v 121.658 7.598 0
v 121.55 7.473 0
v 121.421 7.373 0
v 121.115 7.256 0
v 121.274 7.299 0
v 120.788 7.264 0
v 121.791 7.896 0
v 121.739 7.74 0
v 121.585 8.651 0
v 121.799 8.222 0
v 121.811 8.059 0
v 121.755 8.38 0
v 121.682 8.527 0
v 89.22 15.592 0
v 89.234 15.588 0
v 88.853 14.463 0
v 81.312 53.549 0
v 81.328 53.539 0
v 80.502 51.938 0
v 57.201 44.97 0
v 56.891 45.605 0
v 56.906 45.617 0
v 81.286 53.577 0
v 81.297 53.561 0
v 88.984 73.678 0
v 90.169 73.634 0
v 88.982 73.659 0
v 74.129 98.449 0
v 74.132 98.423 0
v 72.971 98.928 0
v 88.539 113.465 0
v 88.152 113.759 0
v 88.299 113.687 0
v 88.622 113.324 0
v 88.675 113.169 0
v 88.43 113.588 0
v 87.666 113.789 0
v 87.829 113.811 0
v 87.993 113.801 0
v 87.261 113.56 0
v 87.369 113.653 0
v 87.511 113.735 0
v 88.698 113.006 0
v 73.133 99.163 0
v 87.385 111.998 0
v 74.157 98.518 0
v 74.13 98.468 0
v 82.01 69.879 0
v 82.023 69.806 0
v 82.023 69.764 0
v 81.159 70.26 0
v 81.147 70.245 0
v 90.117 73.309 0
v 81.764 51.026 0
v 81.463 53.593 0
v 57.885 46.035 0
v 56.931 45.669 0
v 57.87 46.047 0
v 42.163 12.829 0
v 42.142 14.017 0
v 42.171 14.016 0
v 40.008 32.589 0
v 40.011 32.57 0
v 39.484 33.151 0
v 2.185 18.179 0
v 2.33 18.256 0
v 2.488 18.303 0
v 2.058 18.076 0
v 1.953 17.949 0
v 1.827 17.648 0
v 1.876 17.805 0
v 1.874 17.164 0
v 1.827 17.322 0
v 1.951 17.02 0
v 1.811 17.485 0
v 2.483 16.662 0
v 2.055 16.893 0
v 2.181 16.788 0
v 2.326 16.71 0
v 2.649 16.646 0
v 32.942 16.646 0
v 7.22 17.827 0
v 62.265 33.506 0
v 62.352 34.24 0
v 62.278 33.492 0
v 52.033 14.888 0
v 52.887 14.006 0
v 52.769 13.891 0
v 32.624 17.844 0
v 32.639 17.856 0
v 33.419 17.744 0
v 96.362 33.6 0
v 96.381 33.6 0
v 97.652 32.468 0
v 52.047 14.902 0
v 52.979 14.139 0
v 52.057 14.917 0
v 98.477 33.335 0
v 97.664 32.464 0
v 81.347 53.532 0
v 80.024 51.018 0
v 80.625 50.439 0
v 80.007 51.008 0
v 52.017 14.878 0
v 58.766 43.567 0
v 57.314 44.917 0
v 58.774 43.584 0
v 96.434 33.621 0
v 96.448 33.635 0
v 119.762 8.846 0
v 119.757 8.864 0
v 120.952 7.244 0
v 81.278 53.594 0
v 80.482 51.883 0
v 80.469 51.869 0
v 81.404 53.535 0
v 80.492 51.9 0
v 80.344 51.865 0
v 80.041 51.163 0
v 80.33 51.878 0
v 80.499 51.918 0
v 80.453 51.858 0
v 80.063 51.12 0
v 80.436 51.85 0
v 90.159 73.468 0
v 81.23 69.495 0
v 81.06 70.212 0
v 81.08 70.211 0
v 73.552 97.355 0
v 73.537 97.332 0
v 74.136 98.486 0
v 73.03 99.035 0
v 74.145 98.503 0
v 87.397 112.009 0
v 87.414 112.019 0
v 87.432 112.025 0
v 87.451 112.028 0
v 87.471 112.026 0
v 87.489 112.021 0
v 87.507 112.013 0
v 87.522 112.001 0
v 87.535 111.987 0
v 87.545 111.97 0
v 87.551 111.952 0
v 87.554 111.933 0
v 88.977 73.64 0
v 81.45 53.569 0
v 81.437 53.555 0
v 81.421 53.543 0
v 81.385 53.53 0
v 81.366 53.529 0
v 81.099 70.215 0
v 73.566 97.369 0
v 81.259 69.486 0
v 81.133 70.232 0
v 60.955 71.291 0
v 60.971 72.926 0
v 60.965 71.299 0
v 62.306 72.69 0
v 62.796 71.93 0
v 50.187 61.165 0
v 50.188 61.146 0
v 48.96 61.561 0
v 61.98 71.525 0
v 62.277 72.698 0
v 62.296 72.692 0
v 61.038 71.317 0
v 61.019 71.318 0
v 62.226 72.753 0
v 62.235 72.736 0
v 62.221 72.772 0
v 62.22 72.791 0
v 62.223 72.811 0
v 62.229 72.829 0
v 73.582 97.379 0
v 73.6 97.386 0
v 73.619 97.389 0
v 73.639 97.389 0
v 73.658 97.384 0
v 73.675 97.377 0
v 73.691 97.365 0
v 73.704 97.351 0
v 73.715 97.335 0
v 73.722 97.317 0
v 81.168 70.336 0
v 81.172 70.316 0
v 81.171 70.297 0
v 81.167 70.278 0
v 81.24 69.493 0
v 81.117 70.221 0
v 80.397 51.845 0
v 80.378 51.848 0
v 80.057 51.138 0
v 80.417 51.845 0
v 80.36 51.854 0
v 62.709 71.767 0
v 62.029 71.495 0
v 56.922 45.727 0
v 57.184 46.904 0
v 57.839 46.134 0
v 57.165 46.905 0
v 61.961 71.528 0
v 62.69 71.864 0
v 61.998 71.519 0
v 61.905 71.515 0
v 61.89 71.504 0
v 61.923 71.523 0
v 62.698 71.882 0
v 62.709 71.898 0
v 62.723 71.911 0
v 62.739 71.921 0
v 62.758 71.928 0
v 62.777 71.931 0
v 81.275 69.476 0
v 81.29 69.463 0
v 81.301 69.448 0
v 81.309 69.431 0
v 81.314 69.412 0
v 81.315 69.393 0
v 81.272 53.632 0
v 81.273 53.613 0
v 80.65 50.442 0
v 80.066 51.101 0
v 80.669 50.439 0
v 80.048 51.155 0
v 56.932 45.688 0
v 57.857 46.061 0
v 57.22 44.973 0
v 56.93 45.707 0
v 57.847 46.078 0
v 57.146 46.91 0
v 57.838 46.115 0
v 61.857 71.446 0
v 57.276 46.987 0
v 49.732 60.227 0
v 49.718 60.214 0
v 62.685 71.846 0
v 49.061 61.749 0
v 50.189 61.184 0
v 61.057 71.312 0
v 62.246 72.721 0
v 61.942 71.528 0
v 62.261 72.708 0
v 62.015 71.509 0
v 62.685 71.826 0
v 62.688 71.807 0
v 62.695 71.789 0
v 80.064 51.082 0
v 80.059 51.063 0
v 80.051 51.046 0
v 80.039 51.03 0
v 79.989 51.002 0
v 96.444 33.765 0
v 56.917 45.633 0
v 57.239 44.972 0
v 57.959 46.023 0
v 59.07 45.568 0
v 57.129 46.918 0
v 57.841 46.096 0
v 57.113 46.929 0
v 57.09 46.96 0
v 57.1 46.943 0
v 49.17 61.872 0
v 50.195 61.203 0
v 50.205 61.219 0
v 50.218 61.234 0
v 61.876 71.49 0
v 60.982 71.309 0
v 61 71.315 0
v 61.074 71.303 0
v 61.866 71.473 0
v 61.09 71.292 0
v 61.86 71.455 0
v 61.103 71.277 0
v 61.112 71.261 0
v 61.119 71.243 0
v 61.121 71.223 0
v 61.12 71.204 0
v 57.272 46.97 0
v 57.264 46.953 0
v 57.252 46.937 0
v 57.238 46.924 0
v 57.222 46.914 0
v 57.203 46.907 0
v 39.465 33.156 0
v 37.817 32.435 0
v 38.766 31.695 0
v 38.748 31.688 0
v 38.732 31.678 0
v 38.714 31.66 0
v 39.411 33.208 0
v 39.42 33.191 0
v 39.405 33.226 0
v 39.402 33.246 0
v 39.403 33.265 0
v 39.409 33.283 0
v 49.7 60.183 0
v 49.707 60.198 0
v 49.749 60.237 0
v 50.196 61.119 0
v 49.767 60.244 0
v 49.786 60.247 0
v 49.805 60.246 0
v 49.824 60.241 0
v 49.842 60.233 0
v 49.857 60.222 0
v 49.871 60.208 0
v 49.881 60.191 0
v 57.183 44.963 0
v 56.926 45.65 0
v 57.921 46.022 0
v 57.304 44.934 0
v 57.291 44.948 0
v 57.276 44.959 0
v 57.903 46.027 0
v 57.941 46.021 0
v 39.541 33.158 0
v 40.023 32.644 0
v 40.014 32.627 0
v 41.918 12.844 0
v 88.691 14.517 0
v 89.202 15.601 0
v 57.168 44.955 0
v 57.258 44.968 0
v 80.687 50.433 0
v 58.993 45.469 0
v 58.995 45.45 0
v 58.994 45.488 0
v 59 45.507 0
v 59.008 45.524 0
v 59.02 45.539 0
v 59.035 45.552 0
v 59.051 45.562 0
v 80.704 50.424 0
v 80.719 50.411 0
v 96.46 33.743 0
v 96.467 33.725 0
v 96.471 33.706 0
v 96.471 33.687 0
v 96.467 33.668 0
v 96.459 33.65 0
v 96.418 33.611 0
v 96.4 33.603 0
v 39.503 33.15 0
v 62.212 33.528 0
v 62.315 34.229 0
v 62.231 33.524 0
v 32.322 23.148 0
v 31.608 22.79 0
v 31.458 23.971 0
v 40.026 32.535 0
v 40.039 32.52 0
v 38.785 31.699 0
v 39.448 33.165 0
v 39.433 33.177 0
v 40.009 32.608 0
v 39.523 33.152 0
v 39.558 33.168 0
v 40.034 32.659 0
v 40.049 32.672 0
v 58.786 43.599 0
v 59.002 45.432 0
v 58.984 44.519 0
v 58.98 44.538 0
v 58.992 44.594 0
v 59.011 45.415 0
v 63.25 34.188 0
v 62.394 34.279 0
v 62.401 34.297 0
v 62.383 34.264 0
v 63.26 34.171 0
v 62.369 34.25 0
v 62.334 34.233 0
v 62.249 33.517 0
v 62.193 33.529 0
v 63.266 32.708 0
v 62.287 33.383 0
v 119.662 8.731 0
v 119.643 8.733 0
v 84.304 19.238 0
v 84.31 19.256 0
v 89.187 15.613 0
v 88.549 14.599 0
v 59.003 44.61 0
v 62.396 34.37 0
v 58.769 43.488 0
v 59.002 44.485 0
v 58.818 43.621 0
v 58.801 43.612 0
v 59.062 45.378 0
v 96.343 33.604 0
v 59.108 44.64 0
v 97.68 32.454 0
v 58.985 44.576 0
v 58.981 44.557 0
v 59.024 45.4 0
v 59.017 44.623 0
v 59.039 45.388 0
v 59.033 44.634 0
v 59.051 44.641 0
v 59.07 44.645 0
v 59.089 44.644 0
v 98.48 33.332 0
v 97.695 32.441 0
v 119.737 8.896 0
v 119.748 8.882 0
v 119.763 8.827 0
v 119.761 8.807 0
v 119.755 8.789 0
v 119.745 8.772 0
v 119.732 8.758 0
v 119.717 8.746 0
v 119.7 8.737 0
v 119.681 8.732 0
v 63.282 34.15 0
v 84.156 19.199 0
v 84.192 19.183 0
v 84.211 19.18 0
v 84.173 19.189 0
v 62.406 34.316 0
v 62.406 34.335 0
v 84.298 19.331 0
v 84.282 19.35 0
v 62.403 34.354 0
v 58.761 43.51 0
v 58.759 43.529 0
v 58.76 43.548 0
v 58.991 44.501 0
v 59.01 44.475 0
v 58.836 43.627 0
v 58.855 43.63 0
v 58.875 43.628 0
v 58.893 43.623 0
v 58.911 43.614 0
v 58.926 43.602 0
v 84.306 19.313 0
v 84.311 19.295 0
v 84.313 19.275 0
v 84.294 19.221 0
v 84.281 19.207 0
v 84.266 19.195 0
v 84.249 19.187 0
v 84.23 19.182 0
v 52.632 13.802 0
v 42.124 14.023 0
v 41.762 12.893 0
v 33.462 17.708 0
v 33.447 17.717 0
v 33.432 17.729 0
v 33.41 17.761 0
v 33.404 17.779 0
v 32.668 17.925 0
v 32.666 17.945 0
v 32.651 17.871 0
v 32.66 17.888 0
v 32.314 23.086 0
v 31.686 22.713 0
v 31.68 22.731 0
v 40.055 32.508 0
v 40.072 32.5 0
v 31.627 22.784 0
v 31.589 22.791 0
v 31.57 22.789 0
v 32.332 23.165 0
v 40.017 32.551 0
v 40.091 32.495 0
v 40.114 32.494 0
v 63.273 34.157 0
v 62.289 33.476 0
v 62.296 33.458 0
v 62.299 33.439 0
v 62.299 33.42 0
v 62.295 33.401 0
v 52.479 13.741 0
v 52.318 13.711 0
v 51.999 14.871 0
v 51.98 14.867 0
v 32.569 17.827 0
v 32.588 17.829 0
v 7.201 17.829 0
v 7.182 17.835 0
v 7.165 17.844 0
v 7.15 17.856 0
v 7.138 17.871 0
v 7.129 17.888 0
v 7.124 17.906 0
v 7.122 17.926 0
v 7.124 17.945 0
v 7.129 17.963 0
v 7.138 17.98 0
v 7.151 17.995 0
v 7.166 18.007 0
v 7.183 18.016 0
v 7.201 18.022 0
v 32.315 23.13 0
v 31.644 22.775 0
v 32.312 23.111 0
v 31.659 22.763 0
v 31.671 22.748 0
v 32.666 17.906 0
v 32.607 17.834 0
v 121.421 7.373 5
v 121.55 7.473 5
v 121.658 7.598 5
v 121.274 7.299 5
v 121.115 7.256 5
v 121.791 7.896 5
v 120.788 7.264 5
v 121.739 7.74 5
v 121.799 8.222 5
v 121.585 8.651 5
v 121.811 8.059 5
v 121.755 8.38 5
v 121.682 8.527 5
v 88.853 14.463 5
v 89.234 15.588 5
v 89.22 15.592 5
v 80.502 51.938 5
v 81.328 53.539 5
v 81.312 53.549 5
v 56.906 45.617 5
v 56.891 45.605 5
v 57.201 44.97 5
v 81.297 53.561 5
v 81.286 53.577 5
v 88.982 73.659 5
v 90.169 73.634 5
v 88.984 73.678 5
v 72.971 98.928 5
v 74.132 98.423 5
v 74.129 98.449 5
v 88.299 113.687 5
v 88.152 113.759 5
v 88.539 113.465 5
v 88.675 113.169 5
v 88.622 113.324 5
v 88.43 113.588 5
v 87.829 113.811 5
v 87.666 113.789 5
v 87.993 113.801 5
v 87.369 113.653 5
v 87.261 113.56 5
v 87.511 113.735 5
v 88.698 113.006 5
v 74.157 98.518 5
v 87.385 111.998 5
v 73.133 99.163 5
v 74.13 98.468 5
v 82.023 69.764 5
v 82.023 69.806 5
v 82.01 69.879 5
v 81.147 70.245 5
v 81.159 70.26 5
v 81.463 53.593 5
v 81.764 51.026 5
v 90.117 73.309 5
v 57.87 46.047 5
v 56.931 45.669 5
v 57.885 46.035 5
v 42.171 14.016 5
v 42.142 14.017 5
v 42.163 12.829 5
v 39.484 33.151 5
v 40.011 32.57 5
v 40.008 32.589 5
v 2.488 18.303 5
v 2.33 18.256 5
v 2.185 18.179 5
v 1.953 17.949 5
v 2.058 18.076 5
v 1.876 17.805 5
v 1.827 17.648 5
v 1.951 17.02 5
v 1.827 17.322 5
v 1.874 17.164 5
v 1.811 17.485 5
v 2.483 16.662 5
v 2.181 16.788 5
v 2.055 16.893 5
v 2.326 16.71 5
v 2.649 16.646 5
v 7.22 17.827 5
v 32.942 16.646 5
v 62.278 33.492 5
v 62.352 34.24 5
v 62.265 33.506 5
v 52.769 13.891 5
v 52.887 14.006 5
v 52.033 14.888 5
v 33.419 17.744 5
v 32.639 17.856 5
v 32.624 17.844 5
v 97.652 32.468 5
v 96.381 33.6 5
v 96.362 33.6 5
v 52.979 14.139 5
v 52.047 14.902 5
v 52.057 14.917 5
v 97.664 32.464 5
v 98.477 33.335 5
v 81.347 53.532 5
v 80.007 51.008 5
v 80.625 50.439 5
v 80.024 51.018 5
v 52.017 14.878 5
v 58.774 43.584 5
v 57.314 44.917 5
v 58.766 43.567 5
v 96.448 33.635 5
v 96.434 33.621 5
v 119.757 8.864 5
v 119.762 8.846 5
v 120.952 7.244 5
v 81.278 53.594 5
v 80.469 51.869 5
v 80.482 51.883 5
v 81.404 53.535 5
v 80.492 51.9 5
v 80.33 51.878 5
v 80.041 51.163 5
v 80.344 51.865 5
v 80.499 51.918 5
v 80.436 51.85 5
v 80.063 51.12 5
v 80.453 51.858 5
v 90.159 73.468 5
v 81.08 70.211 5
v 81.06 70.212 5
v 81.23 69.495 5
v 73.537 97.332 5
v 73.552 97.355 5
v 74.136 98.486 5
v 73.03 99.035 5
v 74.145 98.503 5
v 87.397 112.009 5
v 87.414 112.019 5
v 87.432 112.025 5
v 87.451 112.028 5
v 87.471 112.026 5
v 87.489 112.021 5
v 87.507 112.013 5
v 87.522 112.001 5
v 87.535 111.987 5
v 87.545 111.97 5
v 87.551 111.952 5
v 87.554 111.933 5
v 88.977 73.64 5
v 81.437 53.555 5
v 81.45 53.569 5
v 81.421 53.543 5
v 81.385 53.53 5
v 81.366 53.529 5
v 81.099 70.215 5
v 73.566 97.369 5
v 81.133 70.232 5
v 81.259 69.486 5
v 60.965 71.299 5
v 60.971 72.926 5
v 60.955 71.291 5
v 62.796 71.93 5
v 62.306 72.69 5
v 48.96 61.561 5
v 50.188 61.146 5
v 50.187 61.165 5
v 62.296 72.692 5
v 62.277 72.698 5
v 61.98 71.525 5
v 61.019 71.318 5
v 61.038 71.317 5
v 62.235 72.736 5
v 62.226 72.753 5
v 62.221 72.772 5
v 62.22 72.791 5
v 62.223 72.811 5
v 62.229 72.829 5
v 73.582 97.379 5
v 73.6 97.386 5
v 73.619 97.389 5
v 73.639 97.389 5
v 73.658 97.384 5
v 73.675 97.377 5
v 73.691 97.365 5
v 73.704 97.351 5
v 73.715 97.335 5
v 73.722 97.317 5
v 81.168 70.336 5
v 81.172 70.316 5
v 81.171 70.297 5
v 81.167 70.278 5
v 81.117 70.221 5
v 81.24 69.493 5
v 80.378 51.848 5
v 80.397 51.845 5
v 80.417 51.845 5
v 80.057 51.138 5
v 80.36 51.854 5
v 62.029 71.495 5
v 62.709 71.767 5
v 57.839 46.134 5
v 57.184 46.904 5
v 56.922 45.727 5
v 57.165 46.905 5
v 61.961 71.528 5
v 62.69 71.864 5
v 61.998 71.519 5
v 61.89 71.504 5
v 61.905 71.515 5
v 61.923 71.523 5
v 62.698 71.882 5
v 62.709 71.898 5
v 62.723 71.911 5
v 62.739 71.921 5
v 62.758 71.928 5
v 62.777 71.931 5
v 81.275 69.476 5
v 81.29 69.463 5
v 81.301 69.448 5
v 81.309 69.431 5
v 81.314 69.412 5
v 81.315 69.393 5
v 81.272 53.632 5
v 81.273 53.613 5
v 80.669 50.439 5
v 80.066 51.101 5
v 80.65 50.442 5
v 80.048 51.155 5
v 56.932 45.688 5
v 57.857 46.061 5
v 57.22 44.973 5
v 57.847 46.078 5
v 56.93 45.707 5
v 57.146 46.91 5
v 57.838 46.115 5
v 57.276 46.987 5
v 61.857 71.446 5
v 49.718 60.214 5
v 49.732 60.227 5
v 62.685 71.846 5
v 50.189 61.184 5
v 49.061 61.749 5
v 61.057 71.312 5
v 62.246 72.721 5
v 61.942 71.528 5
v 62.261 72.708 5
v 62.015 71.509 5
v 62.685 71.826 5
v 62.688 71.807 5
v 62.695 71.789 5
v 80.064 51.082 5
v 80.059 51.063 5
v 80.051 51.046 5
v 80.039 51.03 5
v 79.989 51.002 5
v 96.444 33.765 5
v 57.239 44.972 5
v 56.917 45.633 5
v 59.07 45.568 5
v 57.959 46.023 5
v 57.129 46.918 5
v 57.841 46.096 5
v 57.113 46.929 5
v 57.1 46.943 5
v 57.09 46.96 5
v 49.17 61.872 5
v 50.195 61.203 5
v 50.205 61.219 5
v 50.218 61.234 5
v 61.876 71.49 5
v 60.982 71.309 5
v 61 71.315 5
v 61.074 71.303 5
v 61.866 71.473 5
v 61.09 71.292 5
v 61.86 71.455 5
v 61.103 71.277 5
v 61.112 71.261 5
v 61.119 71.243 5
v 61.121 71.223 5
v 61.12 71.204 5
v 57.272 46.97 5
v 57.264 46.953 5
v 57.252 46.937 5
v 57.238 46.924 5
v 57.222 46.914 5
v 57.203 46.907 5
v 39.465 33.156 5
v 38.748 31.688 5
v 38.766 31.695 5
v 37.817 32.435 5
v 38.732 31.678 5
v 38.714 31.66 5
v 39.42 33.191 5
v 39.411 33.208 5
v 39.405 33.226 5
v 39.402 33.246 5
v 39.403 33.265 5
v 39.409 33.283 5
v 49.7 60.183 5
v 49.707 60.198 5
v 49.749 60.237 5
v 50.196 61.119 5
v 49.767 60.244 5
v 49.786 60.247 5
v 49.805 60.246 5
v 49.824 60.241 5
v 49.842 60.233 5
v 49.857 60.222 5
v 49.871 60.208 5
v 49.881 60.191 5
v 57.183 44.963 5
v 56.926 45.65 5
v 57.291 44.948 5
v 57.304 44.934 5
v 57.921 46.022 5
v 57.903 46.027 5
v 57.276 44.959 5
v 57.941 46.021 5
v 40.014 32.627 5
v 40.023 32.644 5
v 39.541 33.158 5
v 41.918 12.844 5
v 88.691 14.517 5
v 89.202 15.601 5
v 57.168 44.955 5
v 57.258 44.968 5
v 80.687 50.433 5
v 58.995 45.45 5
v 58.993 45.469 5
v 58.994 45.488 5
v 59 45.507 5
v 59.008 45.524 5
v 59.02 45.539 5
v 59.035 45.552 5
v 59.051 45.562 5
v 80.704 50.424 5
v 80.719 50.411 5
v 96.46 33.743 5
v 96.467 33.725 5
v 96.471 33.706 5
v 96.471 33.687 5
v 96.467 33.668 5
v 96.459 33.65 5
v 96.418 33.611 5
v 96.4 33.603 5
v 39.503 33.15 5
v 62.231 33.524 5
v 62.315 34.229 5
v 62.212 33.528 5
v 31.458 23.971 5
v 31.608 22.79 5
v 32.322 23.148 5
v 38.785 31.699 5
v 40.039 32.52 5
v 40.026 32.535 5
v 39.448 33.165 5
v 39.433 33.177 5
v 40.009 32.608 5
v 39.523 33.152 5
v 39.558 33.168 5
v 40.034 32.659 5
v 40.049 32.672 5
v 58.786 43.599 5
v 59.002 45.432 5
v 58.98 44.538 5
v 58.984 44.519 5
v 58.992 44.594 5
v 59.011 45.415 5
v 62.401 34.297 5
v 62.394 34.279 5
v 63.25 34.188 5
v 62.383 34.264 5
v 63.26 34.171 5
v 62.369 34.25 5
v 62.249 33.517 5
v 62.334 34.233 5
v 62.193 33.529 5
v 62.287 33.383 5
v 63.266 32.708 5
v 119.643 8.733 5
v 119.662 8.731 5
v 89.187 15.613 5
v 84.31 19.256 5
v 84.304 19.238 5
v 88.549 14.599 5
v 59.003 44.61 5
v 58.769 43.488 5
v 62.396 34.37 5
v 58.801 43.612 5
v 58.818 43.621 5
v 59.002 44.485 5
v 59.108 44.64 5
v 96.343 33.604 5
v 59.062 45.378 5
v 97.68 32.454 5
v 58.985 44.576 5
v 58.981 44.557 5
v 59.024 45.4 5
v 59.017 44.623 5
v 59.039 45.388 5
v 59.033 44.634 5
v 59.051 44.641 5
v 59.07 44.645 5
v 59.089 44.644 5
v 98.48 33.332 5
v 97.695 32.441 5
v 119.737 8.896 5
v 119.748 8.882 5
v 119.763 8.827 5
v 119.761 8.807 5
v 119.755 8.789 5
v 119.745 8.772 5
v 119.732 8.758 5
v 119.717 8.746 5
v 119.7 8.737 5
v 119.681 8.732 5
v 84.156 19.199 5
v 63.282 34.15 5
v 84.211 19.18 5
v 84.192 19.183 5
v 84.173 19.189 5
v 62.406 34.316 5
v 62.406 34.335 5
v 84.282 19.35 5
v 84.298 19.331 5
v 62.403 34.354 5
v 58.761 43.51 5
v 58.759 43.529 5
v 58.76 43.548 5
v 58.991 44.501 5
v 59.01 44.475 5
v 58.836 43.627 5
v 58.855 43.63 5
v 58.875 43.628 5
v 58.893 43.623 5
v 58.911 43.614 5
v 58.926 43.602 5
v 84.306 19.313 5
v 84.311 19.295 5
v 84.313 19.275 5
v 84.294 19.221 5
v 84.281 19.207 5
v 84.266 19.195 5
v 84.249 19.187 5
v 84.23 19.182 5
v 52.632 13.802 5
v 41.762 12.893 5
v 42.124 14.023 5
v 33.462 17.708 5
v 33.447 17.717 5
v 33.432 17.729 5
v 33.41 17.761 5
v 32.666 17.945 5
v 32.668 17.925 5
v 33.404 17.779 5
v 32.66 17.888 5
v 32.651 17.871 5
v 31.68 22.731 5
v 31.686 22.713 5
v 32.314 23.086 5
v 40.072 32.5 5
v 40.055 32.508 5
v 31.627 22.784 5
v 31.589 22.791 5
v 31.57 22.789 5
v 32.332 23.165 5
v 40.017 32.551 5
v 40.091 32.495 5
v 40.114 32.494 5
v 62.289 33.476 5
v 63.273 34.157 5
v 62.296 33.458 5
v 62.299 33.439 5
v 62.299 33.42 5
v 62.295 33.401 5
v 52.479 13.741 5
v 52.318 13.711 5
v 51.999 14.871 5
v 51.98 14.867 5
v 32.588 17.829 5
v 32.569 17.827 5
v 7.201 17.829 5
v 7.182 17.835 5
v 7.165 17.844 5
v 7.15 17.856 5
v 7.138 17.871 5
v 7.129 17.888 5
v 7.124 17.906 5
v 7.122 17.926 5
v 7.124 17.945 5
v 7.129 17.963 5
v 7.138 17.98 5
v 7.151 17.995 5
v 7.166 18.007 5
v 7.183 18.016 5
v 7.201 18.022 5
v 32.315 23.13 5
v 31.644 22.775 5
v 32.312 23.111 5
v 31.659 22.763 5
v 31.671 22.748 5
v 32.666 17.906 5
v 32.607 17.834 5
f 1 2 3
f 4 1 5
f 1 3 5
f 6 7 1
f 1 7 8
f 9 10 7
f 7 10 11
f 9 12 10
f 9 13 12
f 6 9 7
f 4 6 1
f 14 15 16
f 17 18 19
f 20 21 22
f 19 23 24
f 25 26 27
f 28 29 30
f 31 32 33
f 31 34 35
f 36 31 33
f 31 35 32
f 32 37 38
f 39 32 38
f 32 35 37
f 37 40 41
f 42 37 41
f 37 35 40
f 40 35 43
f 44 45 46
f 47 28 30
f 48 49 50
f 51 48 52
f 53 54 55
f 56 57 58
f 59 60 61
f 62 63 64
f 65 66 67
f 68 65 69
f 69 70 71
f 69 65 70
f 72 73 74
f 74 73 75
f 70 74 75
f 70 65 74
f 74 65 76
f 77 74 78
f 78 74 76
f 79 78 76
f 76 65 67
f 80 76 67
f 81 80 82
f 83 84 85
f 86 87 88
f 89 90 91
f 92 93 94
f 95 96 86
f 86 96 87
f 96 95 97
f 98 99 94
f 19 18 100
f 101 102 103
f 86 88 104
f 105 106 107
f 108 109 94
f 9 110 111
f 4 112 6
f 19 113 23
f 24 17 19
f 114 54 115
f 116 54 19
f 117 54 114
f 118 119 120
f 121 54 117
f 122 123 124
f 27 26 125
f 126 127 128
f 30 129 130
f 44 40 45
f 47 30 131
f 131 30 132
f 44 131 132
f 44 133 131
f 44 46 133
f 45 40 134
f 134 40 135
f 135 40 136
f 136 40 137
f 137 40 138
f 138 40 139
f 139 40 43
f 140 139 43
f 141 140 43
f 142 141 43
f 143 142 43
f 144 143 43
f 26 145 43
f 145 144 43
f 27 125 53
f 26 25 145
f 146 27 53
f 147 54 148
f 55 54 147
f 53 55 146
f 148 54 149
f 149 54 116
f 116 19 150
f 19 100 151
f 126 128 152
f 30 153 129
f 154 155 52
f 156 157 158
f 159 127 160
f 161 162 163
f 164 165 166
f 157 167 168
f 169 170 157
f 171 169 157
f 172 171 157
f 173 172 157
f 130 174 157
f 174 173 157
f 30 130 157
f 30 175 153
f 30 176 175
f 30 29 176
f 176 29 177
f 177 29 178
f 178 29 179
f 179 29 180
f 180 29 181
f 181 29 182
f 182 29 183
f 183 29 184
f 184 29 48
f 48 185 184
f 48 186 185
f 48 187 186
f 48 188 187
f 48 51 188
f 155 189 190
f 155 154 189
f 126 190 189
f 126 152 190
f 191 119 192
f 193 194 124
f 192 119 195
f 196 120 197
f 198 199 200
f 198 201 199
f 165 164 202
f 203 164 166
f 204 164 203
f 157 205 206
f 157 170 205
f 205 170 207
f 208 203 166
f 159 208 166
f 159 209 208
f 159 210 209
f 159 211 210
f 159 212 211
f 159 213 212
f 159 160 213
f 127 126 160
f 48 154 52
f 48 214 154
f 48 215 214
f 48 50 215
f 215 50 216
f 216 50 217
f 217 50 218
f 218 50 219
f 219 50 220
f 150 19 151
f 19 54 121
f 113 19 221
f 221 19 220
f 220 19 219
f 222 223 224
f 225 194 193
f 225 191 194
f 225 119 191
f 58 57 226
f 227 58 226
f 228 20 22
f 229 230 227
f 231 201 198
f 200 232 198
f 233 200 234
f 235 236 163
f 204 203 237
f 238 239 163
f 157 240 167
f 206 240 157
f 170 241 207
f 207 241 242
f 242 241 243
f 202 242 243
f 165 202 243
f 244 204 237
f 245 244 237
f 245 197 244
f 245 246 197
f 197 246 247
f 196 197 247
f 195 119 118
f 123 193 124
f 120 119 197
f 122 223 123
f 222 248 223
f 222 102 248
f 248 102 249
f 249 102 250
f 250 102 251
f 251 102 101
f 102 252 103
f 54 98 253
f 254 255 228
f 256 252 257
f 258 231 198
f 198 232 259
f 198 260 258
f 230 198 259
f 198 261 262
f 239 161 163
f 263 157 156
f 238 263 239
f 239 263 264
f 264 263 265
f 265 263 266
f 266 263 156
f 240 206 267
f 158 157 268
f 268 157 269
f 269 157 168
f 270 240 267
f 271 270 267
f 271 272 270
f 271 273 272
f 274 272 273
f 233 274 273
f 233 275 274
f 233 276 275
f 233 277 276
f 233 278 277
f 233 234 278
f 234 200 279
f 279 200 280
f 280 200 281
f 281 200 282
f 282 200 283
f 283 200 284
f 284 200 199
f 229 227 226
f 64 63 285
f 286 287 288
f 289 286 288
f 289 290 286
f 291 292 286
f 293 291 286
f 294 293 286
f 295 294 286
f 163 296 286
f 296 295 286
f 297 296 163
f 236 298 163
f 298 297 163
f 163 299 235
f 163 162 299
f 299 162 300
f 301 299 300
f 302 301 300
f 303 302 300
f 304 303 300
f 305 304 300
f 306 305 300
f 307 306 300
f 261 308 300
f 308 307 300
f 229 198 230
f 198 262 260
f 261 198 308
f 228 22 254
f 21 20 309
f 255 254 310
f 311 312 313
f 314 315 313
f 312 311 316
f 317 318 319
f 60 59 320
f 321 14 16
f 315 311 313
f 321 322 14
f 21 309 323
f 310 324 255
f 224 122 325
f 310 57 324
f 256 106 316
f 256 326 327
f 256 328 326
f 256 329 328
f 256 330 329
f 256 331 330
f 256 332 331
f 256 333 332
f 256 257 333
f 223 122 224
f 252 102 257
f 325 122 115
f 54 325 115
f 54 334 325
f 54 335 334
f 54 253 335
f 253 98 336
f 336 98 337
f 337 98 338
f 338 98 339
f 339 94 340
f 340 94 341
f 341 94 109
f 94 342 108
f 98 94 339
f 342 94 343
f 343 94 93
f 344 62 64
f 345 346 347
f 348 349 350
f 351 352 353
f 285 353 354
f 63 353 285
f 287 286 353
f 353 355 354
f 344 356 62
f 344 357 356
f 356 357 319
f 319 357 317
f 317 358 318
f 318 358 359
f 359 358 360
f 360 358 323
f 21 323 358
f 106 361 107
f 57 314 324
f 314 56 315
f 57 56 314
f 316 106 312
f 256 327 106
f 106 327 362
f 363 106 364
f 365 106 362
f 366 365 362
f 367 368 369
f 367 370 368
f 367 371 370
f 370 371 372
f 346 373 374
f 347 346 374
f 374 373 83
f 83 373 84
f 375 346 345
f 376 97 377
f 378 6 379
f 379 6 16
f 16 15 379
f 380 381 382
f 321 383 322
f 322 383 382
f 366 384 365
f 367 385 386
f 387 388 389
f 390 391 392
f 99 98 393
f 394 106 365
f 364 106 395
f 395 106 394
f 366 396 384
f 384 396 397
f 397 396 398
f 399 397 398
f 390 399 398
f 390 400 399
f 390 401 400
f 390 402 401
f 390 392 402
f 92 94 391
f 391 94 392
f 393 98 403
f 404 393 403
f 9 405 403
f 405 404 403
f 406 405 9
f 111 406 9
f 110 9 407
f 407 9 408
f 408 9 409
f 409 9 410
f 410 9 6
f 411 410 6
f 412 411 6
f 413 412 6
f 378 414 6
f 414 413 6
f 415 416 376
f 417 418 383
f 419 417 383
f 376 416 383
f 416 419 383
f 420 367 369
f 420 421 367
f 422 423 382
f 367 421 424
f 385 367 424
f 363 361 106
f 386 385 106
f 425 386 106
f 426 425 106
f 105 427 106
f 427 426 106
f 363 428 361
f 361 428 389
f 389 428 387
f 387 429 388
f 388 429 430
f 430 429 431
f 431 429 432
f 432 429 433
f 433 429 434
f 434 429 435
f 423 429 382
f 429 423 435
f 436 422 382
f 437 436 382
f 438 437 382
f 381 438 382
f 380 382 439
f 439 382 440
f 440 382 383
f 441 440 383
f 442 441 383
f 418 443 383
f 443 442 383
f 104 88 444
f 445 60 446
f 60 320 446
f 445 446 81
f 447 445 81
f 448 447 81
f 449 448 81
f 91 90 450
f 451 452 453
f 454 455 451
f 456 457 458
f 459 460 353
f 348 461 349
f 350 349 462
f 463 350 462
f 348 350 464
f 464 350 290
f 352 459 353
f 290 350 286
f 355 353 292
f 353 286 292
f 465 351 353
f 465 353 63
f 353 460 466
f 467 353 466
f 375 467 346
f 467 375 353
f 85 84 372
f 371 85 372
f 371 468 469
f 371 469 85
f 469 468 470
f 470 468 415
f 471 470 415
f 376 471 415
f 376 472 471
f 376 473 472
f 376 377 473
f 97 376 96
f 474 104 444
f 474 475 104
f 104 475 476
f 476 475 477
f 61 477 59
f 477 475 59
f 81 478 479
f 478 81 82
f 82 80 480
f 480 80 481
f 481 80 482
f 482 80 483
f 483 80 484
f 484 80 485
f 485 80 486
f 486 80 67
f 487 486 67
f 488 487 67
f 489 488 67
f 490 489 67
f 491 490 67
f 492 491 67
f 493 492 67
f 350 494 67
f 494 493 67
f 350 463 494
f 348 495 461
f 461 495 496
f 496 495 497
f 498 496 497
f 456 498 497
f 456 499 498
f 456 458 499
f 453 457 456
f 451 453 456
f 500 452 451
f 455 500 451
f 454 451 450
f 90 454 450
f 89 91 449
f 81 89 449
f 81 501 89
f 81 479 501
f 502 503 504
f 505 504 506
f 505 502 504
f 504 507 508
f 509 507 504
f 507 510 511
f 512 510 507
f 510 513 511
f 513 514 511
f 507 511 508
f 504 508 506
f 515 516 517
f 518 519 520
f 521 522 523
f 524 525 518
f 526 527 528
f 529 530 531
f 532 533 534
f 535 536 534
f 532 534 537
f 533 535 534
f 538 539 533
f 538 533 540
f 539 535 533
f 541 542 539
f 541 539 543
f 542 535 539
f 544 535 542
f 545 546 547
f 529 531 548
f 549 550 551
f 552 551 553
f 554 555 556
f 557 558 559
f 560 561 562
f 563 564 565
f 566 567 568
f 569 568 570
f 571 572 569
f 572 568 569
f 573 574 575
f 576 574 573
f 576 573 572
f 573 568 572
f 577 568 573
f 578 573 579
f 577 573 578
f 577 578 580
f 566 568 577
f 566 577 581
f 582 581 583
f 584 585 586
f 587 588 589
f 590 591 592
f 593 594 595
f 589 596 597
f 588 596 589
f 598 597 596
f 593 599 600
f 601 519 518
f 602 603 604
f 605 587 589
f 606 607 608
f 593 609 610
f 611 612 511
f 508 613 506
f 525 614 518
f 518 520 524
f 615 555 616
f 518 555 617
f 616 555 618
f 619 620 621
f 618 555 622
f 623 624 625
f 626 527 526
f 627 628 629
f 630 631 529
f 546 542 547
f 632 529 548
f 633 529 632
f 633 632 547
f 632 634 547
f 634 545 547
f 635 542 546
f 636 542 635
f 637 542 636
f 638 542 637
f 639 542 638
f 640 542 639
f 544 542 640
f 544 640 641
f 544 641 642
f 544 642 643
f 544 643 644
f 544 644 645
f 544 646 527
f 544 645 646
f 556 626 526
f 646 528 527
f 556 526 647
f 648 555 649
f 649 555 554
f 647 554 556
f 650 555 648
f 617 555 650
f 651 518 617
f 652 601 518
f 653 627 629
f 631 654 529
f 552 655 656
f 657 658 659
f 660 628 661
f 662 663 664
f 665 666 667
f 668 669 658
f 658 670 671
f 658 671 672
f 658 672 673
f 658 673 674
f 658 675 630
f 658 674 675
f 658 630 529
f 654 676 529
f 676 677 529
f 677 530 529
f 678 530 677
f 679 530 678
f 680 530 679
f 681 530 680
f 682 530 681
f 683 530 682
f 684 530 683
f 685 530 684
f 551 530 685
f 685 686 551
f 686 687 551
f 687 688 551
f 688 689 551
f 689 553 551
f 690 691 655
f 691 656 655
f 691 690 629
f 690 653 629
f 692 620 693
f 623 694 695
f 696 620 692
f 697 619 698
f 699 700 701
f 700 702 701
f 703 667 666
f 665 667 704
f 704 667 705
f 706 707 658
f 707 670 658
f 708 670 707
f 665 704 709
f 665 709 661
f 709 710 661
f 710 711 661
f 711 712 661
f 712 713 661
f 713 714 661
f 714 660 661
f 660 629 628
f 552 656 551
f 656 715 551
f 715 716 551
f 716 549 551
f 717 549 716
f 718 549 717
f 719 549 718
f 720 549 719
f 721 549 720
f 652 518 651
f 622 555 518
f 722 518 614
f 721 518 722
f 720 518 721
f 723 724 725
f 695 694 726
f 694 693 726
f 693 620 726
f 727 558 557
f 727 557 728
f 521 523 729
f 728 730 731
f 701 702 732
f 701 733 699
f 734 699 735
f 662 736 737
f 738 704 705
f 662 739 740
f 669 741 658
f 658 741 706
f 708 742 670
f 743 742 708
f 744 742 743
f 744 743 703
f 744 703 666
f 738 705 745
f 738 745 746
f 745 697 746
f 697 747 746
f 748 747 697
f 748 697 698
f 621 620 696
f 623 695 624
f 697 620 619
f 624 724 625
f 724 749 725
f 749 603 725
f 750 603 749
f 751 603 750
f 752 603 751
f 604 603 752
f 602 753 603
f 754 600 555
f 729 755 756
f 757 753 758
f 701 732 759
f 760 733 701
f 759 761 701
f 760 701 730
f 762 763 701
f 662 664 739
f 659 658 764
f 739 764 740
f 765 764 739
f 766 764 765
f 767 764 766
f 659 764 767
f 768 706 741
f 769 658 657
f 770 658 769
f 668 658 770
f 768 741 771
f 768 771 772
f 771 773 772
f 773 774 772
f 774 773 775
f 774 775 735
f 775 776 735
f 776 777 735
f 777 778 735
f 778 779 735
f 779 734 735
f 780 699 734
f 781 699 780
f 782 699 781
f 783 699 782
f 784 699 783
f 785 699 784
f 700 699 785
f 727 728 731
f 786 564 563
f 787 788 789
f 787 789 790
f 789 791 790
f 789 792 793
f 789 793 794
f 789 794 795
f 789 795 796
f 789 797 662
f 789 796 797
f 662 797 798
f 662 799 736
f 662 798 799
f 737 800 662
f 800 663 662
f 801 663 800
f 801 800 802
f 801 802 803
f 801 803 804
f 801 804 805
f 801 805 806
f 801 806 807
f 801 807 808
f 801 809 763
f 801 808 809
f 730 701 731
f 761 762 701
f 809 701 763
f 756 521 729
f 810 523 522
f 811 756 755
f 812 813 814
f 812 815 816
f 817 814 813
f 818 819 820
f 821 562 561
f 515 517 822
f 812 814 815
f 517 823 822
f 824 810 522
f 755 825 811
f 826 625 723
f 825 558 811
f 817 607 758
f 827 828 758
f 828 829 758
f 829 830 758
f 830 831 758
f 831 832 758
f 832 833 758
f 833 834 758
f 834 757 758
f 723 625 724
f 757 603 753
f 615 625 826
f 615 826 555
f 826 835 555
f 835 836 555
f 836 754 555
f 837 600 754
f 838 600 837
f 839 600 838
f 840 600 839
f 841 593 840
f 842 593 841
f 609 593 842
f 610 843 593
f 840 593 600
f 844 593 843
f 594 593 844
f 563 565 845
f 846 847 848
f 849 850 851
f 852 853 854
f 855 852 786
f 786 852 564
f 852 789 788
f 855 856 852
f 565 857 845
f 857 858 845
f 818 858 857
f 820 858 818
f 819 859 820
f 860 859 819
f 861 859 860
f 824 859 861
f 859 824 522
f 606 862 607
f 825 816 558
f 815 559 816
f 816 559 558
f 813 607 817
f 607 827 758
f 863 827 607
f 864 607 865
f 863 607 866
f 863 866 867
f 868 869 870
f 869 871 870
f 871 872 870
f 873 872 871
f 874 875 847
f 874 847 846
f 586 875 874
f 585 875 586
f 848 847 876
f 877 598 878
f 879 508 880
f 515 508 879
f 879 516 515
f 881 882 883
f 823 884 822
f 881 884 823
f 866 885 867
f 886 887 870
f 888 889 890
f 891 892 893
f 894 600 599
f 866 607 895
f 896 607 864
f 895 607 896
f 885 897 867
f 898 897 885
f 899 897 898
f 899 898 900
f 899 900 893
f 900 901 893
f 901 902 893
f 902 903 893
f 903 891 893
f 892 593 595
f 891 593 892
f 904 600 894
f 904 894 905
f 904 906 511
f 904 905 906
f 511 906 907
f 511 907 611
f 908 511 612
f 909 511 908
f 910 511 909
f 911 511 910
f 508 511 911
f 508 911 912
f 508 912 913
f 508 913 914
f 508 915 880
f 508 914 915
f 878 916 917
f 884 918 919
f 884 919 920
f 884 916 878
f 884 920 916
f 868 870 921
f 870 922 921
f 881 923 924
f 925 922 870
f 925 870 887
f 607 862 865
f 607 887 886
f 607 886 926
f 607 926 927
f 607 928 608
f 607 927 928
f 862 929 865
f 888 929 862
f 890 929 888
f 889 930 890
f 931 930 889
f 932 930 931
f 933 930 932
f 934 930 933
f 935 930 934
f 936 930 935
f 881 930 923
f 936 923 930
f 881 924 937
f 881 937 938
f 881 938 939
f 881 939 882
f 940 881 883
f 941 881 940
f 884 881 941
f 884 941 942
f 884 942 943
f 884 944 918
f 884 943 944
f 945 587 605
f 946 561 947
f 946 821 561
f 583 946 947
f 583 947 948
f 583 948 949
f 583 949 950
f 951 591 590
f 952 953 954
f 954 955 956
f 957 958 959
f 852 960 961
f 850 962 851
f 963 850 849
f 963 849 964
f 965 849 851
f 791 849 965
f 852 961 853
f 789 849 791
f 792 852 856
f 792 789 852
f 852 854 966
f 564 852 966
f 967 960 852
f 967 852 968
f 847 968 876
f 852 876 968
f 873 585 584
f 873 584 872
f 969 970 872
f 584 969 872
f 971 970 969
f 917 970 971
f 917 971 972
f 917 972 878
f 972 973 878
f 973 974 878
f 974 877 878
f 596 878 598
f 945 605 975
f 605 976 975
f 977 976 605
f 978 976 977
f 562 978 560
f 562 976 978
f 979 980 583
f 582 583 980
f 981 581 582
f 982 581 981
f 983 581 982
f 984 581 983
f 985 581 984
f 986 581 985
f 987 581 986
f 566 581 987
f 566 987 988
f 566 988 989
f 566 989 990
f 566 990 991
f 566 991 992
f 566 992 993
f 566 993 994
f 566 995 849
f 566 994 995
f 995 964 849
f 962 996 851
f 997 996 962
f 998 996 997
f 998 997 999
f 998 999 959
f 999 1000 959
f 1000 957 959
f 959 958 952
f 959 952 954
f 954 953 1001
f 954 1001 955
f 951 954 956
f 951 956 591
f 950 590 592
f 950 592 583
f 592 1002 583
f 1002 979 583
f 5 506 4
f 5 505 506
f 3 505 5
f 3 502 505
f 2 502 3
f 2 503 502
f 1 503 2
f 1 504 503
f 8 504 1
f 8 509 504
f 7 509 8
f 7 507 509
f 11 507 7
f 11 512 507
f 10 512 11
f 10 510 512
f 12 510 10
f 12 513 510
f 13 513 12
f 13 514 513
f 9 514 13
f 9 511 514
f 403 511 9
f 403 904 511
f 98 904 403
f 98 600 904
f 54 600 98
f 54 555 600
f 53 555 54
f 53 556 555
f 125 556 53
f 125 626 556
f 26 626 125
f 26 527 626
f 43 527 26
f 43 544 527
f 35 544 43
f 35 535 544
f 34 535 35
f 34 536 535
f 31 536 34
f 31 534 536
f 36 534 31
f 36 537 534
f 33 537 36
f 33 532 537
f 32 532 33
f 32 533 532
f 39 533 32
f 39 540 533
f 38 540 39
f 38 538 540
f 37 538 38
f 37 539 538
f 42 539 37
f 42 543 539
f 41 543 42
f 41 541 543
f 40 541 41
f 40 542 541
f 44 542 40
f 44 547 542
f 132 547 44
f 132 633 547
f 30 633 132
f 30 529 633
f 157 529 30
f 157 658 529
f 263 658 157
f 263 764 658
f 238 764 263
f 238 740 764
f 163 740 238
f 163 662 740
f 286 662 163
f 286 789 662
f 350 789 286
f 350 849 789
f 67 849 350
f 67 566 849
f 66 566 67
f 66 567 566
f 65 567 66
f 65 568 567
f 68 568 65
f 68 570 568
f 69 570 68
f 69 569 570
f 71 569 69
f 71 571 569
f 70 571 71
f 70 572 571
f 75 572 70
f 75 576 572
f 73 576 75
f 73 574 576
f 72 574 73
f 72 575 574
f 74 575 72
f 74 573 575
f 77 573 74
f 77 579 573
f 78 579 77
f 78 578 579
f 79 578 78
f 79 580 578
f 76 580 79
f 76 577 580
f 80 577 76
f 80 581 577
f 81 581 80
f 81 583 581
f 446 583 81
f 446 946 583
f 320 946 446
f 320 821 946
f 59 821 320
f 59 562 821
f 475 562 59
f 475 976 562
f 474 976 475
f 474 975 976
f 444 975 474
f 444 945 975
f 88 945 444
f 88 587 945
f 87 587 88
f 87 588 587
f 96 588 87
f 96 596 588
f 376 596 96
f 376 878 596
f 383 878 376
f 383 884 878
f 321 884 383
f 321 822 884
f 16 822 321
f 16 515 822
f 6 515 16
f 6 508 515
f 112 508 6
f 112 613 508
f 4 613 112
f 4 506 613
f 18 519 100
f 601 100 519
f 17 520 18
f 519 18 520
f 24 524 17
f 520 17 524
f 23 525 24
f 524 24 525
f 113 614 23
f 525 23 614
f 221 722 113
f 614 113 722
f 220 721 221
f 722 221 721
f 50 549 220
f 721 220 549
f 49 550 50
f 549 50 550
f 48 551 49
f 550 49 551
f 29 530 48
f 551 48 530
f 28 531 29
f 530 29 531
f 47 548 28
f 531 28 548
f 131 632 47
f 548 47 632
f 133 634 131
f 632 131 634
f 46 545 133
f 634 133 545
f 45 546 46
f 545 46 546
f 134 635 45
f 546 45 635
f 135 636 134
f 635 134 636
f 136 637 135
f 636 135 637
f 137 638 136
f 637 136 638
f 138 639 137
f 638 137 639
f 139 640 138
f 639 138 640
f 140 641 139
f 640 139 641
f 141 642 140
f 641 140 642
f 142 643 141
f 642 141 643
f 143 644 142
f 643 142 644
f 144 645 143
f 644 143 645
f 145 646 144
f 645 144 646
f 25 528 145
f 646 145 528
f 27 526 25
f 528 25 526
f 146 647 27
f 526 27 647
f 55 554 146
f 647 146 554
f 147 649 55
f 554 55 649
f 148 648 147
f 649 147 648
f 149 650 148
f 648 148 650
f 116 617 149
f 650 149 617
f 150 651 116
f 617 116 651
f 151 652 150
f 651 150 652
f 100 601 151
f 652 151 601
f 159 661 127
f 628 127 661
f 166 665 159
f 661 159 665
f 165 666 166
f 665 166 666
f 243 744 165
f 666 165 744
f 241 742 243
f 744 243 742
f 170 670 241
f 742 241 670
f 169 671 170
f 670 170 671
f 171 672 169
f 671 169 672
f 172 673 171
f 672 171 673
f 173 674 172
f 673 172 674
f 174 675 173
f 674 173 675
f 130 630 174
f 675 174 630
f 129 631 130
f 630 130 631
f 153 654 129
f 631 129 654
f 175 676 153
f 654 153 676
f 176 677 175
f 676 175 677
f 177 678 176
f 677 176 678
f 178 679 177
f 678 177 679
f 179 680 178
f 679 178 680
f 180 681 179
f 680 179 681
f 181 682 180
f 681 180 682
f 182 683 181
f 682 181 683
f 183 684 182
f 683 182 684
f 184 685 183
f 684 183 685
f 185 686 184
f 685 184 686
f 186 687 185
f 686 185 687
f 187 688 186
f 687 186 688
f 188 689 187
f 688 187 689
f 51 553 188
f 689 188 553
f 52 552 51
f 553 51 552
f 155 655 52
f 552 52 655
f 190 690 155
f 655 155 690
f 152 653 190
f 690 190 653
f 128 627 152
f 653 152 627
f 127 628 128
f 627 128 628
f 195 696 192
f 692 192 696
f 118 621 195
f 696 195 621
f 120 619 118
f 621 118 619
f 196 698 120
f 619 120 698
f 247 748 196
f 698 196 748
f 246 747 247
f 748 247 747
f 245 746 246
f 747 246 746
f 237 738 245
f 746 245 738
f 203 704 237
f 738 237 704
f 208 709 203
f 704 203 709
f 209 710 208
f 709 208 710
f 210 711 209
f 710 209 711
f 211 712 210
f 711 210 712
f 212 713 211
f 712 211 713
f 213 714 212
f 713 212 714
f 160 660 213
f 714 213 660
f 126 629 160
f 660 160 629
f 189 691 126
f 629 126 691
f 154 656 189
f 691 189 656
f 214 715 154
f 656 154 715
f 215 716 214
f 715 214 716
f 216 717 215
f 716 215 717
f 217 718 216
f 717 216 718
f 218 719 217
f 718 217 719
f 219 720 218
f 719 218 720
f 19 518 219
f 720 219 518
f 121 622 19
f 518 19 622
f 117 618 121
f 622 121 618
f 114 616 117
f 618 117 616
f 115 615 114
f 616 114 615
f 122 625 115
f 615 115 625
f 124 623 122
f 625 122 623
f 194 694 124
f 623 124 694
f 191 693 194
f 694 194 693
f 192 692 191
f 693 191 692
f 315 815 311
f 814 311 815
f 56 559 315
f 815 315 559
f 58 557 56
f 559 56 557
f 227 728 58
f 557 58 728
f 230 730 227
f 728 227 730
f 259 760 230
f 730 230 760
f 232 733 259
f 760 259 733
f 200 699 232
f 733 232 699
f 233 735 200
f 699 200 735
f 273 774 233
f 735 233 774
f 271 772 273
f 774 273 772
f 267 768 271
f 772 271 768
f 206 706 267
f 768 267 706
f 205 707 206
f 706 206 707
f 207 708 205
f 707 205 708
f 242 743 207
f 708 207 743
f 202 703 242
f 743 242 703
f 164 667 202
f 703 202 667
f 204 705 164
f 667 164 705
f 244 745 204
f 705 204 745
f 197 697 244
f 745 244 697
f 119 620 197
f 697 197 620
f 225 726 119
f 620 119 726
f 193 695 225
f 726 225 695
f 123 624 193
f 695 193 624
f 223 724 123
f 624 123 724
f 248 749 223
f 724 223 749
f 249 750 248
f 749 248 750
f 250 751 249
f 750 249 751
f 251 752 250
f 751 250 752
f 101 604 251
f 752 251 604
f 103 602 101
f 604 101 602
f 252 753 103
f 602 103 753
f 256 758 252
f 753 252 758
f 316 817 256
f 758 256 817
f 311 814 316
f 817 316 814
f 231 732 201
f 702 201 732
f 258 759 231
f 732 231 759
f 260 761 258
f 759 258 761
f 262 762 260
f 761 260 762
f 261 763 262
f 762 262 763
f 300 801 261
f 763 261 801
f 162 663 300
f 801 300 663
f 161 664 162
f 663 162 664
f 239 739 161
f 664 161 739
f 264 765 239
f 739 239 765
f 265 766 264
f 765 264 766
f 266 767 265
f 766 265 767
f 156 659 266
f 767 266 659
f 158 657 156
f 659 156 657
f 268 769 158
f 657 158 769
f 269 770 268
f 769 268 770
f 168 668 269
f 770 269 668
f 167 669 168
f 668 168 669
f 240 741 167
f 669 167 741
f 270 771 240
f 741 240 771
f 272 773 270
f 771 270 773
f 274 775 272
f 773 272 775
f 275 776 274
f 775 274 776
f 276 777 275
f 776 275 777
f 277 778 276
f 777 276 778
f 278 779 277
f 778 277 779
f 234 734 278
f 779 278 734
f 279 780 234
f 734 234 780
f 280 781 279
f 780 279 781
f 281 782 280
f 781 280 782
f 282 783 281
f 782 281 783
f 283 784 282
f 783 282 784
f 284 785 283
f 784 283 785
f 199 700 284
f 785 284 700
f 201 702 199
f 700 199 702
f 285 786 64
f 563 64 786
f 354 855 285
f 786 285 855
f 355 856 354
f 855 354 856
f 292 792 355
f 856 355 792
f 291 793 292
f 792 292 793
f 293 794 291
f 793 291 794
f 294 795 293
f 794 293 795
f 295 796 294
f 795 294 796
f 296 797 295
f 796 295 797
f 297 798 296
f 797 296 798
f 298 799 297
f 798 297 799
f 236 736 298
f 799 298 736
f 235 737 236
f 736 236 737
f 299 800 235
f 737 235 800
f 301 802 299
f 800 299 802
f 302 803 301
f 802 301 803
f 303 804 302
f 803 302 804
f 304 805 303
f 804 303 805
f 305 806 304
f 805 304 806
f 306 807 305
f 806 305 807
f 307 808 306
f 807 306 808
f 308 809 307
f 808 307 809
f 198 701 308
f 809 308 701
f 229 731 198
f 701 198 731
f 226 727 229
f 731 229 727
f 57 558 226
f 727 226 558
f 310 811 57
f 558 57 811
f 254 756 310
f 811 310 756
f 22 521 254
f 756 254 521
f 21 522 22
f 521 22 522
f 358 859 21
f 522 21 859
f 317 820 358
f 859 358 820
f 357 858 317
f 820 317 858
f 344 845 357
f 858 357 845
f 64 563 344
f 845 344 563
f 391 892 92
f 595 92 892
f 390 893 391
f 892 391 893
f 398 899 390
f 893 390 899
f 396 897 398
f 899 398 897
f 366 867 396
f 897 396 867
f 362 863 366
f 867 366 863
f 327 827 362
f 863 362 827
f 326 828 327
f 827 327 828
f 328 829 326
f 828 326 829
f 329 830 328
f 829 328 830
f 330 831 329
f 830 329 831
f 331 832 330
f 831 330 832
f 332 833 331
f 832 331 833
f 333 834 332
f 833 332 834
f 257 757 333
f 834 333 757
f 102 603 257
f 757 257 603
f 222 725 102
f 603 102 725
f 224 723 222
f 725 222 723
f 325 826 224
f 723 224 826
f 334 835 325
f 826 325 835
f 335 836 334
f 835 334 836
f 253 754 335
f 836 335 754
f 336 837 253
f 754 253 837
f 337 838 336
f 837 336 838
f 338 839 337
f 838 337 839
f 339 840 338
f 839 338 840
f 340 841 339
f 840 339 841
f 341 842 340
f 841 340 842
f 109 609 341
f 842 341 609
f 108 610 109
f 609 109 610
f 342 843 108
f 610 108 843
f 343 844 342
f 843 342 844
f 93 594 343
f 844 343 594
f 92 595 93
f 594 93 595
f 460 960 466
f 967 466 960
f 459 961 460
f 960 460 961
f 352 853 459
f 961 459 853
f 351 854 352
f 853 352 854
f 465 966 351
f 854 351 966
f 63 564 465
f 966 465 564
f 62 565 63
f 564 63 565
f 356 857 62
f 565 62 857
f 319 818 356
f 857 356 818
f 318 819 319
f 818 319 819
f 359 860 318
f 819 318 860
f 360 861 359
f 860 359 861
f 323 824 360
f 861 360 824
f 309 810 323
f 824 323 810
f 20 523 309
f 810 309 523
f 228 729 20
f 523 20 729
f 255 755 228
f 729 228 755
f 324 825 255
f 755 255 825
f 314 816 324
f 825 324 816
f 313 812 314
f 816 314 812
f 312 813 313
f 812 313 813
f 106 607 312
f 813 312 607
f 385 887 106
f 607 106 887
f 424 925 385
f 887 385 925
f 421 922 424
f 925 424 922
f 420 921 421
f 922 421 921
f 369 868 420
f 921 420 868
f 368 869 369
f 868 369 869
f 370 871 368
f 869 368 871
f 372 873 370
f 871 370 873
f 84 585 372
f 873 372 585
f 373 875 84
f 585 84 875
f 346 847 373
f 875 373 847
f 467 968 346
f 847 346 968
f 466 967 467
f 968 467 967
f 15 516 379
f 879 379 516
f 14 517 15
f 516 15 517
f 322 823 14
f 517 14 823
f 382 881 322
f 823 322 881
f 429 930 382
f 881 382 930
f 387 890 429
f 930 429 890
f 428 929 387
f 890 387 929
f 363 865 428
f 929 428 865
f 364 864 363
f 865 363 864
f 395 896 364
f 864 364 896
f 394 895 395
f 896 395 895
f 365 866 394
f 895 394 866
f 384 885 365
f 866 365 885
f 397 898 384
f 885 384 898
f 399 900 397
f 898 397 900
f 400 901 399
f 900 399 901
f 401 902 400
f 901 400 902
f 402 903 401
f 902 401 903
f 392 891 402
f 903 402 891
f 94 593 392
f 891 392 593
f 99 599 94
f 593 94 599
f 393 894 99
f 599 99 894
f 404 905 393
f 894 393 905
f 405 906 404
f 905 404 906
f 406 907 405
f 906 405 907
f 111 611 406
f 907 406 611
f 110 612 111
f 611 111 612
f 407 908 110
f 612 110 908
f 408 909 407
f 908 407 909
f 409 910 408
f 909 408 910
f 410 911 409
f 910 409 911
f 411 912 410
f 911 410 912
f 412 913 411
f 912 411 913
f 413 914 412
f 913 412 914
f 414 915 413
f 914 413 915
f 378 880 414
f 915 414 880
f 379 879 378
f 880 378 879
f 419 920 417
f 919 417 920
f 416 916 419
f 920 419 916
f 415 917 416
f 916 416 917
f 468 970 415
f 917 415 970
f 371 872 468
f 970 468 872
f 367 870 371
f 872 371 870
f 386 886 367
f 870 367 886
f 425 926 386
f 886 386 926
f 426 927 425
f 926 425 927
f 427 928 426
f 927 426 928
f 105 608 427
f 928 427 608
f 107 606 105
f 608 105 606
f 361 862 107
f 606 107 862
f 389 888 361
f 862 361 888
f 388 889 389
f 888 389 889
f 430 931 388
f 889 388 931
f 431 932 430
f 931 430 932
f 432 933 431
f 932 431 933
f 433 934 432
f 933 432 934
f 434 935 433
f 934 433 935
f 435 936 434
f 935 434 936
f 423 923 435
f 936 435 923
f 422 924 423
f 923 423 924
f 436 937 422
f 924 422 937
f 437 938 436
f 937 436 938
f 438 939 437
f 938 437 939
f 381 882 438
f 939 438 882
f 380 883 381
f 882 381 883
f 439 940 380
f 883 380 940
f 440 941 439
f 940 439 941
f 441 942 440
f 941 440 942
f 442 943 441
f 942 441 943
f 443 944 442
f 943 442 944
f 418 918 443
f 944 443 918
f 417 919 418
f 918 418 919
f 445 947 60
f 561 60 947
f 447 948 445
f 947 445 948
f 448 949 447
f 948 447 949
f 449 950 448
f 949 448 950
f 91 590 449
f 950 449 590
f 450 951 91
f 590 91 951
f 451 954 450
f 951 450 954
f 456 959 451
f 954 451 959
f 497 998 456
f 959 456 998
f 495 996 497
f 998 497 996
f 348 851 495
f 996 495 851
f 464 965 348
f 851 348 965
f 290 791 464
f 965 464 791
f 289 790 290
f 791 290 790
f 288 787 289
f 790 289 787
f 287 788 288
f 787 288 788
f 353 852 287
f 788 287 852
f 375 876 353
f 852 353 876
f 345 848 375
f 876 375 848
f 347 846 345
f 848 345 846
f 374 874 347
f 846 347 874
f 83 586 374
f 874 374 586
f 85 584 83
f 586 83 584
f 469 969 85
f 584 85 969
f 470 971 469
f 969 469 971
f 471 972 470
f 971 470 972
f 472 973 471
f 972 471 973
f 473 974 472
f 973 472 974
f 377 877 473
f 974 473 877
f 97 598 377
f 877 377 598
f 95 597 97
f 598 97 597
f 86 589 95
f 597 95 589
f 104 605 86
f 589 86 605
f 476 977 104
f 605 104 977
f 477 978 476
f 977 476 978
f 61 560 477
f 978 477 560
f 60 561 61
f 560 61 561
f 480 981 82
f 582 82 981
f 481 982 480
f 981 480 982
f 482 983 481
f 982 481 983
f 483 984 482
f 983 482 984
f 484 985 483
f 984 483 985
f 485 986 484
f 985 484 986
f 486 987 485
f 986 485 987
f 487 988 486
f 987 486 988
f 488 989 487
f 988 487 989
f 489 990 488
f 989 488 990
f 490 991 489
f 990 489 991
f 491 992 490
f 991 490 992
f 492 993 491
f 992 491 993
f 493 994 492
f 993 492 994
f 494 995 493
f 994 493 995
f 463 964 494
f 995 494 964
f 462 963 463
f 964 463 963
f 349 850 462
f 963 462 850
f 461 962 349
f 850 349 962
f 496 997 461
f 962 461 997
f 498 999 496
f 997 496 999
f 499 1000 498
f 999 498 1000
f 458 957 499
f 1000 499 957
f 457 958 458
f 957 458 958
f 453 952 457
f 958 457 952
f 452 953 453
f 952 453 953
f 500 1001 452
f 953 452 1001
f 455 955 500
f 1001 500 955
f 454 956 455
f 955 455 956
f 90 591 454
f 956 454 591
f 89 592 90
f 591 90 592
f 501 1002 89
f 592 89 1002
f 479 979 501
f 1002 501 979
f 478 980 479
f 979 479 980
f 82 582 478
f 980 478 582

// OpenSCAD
/*
 * Customizable Origami - Hummingbird - https://www.thingiverse.com/thing:2638920
 * by Dennis Hofmann - https://www.thingiverse.com/mightynozzle/about
 * created 2017-11-11
 * version v1.0
 *
 * Changelog
 * --------------
 * v1.0:
 *      - final design
 * --------------
 * 
 * This work is licensed under the Creative Commons - Attribution - NonCommercial - ShareAlike license.
 * https://creativecommons.org/licenses/by-nc-sa/3.0/
 */


 // Parameter Section //
//-------------------//

// preview[view:north, tilt:top]

// The maximum size of the longest side. The shorter side will be automatically resized in same ratio.
max_size_in_millimeter = 120; //[20:300]

// The height of the model.
model_height_in_millimeter = 5; //[0.2:0.2:100]

// Thickness of the outer outline.
outline_size_in_millimeter = 1.2; //[0.5:0.1:20]

// Thickness of the inner outline.
inline_size_in_millimeter = 0.7; //[0.5:0.1:20]

// Roundiness of the ends of the inner outlines.
inline_edge_radius_in_millimeter = 0.1; //[0.0:0.1:5]

// Flip model
flip_model = "no"; //[yes,no]

/*[hidden]*/
max_size = max_size_in_millimeter;
model_height = model_height_in_millimeter;
$fn=32;

// Outer Points
A1 = [18, 119];
A2 = [225, 119];
A3 = [286, 93];
A4 = [355, 99];
A5 = [428, 231];
A6 = [605, 104];
A7 = [822, 55];
A8 = [665, 223];
A9 = [549, 346];
A10 = [607, 501];
A11 = [597, 769];
A12 = [501, 671];
A13 = [419, 493];
A14 = [338, 417];
A15 = [262, 218];
A16 = [217, 158];

outline = [A1, A2, A3, A4, A5, A6, A7, A8, A9, A10, A11, A12, A13, A14, A15, A16];

// Inner Points
B1 = [390, 310];
B2 = [555, 475];

// Polygons
C1 = [A1, A2, A16];
C2 = [A15, A5, A4, A3, A2, A16];
C3 = [B1, A6, A7, A8];
C4 = [A6, A5, B1];
C5 = [B1, A15, A5];
C6 = [A15, A14, B1];
C7 = [A8, A9, B1];
C8 = [B1, A14, A13];
C9 = [A12, B2, A9, A10, A11];
C10 = [A12, B2, A13];
C11 = [B2, A9, A13];
C12 = [A9, B1, A13];

cut_polygons = [C1, C2, C3, C4, C5, C6, C7, C8, C9, C10, C11, C12];

min_x = A1[0];
min_y = A7[1];
max_x = A7[0];
max_y = A11[1];

x_size = max_x - min_x;
y_size = max_y - min_y;

x_factor = max_size / x_size;
y_factor = max_size / y_size;

inline_size = x_size > y_size ? inline_size_in_millimeter / x_factor / 2: inline_size_in_millimeter / y_factor / 2;
inline_edge_radius = x_size > y_size ? inline_edge_radius_in_millimeter / x_factor: inline_edge_radius_in_millimeter / y_factor;
outline_size = x_size > y_size ? outline_size_in_millimeter / x_factor - inline_size: outline_size_in_millimeter / y_factor - inline_size;


 // Program Section //
//-----------------//

if(x_size > y_size) {
    resize(newsize=[max_size, x_factor * y_size, model_height]){
        if(flip_model == "yes") {
            mirror([0,1,0]) {
                rotate([180,180,0]) {    
                    create(outline, cut_polygons);
                }
            }
        } else {
            create(outline, cut_polygons);
        }
    }
} else {
    resize(newsize=[y_factor * x_size, max_size, model_height]){
        if(flip_model == "yes") {
            mirror([0,1,0]) {
                rotate([180,180,0]) {    
                    create(outline, cut_polygons);
                }
            }
        } else {
            create(outline, cut_polygons);
        }
    }
}


 // Module Section //
//----------------//

module create() {
    linear_extrude(height=1) {
        difference() {
            offset(r = -0) {
                offset(r = +outline_size) {
                    polygon(points = outline, convexity = 10);
                }
            }
            
            for(cut_polygon = [0:len(cut_polygons)]) {
                offset(r = +inline_edge_radius) {
                    offset(r = -inline_size - inline_edge_radius) {
                        polygon(points = cut_polygons[cut_polygon], convexity = 10);
                    }
                }
            }
        }
    }
}
